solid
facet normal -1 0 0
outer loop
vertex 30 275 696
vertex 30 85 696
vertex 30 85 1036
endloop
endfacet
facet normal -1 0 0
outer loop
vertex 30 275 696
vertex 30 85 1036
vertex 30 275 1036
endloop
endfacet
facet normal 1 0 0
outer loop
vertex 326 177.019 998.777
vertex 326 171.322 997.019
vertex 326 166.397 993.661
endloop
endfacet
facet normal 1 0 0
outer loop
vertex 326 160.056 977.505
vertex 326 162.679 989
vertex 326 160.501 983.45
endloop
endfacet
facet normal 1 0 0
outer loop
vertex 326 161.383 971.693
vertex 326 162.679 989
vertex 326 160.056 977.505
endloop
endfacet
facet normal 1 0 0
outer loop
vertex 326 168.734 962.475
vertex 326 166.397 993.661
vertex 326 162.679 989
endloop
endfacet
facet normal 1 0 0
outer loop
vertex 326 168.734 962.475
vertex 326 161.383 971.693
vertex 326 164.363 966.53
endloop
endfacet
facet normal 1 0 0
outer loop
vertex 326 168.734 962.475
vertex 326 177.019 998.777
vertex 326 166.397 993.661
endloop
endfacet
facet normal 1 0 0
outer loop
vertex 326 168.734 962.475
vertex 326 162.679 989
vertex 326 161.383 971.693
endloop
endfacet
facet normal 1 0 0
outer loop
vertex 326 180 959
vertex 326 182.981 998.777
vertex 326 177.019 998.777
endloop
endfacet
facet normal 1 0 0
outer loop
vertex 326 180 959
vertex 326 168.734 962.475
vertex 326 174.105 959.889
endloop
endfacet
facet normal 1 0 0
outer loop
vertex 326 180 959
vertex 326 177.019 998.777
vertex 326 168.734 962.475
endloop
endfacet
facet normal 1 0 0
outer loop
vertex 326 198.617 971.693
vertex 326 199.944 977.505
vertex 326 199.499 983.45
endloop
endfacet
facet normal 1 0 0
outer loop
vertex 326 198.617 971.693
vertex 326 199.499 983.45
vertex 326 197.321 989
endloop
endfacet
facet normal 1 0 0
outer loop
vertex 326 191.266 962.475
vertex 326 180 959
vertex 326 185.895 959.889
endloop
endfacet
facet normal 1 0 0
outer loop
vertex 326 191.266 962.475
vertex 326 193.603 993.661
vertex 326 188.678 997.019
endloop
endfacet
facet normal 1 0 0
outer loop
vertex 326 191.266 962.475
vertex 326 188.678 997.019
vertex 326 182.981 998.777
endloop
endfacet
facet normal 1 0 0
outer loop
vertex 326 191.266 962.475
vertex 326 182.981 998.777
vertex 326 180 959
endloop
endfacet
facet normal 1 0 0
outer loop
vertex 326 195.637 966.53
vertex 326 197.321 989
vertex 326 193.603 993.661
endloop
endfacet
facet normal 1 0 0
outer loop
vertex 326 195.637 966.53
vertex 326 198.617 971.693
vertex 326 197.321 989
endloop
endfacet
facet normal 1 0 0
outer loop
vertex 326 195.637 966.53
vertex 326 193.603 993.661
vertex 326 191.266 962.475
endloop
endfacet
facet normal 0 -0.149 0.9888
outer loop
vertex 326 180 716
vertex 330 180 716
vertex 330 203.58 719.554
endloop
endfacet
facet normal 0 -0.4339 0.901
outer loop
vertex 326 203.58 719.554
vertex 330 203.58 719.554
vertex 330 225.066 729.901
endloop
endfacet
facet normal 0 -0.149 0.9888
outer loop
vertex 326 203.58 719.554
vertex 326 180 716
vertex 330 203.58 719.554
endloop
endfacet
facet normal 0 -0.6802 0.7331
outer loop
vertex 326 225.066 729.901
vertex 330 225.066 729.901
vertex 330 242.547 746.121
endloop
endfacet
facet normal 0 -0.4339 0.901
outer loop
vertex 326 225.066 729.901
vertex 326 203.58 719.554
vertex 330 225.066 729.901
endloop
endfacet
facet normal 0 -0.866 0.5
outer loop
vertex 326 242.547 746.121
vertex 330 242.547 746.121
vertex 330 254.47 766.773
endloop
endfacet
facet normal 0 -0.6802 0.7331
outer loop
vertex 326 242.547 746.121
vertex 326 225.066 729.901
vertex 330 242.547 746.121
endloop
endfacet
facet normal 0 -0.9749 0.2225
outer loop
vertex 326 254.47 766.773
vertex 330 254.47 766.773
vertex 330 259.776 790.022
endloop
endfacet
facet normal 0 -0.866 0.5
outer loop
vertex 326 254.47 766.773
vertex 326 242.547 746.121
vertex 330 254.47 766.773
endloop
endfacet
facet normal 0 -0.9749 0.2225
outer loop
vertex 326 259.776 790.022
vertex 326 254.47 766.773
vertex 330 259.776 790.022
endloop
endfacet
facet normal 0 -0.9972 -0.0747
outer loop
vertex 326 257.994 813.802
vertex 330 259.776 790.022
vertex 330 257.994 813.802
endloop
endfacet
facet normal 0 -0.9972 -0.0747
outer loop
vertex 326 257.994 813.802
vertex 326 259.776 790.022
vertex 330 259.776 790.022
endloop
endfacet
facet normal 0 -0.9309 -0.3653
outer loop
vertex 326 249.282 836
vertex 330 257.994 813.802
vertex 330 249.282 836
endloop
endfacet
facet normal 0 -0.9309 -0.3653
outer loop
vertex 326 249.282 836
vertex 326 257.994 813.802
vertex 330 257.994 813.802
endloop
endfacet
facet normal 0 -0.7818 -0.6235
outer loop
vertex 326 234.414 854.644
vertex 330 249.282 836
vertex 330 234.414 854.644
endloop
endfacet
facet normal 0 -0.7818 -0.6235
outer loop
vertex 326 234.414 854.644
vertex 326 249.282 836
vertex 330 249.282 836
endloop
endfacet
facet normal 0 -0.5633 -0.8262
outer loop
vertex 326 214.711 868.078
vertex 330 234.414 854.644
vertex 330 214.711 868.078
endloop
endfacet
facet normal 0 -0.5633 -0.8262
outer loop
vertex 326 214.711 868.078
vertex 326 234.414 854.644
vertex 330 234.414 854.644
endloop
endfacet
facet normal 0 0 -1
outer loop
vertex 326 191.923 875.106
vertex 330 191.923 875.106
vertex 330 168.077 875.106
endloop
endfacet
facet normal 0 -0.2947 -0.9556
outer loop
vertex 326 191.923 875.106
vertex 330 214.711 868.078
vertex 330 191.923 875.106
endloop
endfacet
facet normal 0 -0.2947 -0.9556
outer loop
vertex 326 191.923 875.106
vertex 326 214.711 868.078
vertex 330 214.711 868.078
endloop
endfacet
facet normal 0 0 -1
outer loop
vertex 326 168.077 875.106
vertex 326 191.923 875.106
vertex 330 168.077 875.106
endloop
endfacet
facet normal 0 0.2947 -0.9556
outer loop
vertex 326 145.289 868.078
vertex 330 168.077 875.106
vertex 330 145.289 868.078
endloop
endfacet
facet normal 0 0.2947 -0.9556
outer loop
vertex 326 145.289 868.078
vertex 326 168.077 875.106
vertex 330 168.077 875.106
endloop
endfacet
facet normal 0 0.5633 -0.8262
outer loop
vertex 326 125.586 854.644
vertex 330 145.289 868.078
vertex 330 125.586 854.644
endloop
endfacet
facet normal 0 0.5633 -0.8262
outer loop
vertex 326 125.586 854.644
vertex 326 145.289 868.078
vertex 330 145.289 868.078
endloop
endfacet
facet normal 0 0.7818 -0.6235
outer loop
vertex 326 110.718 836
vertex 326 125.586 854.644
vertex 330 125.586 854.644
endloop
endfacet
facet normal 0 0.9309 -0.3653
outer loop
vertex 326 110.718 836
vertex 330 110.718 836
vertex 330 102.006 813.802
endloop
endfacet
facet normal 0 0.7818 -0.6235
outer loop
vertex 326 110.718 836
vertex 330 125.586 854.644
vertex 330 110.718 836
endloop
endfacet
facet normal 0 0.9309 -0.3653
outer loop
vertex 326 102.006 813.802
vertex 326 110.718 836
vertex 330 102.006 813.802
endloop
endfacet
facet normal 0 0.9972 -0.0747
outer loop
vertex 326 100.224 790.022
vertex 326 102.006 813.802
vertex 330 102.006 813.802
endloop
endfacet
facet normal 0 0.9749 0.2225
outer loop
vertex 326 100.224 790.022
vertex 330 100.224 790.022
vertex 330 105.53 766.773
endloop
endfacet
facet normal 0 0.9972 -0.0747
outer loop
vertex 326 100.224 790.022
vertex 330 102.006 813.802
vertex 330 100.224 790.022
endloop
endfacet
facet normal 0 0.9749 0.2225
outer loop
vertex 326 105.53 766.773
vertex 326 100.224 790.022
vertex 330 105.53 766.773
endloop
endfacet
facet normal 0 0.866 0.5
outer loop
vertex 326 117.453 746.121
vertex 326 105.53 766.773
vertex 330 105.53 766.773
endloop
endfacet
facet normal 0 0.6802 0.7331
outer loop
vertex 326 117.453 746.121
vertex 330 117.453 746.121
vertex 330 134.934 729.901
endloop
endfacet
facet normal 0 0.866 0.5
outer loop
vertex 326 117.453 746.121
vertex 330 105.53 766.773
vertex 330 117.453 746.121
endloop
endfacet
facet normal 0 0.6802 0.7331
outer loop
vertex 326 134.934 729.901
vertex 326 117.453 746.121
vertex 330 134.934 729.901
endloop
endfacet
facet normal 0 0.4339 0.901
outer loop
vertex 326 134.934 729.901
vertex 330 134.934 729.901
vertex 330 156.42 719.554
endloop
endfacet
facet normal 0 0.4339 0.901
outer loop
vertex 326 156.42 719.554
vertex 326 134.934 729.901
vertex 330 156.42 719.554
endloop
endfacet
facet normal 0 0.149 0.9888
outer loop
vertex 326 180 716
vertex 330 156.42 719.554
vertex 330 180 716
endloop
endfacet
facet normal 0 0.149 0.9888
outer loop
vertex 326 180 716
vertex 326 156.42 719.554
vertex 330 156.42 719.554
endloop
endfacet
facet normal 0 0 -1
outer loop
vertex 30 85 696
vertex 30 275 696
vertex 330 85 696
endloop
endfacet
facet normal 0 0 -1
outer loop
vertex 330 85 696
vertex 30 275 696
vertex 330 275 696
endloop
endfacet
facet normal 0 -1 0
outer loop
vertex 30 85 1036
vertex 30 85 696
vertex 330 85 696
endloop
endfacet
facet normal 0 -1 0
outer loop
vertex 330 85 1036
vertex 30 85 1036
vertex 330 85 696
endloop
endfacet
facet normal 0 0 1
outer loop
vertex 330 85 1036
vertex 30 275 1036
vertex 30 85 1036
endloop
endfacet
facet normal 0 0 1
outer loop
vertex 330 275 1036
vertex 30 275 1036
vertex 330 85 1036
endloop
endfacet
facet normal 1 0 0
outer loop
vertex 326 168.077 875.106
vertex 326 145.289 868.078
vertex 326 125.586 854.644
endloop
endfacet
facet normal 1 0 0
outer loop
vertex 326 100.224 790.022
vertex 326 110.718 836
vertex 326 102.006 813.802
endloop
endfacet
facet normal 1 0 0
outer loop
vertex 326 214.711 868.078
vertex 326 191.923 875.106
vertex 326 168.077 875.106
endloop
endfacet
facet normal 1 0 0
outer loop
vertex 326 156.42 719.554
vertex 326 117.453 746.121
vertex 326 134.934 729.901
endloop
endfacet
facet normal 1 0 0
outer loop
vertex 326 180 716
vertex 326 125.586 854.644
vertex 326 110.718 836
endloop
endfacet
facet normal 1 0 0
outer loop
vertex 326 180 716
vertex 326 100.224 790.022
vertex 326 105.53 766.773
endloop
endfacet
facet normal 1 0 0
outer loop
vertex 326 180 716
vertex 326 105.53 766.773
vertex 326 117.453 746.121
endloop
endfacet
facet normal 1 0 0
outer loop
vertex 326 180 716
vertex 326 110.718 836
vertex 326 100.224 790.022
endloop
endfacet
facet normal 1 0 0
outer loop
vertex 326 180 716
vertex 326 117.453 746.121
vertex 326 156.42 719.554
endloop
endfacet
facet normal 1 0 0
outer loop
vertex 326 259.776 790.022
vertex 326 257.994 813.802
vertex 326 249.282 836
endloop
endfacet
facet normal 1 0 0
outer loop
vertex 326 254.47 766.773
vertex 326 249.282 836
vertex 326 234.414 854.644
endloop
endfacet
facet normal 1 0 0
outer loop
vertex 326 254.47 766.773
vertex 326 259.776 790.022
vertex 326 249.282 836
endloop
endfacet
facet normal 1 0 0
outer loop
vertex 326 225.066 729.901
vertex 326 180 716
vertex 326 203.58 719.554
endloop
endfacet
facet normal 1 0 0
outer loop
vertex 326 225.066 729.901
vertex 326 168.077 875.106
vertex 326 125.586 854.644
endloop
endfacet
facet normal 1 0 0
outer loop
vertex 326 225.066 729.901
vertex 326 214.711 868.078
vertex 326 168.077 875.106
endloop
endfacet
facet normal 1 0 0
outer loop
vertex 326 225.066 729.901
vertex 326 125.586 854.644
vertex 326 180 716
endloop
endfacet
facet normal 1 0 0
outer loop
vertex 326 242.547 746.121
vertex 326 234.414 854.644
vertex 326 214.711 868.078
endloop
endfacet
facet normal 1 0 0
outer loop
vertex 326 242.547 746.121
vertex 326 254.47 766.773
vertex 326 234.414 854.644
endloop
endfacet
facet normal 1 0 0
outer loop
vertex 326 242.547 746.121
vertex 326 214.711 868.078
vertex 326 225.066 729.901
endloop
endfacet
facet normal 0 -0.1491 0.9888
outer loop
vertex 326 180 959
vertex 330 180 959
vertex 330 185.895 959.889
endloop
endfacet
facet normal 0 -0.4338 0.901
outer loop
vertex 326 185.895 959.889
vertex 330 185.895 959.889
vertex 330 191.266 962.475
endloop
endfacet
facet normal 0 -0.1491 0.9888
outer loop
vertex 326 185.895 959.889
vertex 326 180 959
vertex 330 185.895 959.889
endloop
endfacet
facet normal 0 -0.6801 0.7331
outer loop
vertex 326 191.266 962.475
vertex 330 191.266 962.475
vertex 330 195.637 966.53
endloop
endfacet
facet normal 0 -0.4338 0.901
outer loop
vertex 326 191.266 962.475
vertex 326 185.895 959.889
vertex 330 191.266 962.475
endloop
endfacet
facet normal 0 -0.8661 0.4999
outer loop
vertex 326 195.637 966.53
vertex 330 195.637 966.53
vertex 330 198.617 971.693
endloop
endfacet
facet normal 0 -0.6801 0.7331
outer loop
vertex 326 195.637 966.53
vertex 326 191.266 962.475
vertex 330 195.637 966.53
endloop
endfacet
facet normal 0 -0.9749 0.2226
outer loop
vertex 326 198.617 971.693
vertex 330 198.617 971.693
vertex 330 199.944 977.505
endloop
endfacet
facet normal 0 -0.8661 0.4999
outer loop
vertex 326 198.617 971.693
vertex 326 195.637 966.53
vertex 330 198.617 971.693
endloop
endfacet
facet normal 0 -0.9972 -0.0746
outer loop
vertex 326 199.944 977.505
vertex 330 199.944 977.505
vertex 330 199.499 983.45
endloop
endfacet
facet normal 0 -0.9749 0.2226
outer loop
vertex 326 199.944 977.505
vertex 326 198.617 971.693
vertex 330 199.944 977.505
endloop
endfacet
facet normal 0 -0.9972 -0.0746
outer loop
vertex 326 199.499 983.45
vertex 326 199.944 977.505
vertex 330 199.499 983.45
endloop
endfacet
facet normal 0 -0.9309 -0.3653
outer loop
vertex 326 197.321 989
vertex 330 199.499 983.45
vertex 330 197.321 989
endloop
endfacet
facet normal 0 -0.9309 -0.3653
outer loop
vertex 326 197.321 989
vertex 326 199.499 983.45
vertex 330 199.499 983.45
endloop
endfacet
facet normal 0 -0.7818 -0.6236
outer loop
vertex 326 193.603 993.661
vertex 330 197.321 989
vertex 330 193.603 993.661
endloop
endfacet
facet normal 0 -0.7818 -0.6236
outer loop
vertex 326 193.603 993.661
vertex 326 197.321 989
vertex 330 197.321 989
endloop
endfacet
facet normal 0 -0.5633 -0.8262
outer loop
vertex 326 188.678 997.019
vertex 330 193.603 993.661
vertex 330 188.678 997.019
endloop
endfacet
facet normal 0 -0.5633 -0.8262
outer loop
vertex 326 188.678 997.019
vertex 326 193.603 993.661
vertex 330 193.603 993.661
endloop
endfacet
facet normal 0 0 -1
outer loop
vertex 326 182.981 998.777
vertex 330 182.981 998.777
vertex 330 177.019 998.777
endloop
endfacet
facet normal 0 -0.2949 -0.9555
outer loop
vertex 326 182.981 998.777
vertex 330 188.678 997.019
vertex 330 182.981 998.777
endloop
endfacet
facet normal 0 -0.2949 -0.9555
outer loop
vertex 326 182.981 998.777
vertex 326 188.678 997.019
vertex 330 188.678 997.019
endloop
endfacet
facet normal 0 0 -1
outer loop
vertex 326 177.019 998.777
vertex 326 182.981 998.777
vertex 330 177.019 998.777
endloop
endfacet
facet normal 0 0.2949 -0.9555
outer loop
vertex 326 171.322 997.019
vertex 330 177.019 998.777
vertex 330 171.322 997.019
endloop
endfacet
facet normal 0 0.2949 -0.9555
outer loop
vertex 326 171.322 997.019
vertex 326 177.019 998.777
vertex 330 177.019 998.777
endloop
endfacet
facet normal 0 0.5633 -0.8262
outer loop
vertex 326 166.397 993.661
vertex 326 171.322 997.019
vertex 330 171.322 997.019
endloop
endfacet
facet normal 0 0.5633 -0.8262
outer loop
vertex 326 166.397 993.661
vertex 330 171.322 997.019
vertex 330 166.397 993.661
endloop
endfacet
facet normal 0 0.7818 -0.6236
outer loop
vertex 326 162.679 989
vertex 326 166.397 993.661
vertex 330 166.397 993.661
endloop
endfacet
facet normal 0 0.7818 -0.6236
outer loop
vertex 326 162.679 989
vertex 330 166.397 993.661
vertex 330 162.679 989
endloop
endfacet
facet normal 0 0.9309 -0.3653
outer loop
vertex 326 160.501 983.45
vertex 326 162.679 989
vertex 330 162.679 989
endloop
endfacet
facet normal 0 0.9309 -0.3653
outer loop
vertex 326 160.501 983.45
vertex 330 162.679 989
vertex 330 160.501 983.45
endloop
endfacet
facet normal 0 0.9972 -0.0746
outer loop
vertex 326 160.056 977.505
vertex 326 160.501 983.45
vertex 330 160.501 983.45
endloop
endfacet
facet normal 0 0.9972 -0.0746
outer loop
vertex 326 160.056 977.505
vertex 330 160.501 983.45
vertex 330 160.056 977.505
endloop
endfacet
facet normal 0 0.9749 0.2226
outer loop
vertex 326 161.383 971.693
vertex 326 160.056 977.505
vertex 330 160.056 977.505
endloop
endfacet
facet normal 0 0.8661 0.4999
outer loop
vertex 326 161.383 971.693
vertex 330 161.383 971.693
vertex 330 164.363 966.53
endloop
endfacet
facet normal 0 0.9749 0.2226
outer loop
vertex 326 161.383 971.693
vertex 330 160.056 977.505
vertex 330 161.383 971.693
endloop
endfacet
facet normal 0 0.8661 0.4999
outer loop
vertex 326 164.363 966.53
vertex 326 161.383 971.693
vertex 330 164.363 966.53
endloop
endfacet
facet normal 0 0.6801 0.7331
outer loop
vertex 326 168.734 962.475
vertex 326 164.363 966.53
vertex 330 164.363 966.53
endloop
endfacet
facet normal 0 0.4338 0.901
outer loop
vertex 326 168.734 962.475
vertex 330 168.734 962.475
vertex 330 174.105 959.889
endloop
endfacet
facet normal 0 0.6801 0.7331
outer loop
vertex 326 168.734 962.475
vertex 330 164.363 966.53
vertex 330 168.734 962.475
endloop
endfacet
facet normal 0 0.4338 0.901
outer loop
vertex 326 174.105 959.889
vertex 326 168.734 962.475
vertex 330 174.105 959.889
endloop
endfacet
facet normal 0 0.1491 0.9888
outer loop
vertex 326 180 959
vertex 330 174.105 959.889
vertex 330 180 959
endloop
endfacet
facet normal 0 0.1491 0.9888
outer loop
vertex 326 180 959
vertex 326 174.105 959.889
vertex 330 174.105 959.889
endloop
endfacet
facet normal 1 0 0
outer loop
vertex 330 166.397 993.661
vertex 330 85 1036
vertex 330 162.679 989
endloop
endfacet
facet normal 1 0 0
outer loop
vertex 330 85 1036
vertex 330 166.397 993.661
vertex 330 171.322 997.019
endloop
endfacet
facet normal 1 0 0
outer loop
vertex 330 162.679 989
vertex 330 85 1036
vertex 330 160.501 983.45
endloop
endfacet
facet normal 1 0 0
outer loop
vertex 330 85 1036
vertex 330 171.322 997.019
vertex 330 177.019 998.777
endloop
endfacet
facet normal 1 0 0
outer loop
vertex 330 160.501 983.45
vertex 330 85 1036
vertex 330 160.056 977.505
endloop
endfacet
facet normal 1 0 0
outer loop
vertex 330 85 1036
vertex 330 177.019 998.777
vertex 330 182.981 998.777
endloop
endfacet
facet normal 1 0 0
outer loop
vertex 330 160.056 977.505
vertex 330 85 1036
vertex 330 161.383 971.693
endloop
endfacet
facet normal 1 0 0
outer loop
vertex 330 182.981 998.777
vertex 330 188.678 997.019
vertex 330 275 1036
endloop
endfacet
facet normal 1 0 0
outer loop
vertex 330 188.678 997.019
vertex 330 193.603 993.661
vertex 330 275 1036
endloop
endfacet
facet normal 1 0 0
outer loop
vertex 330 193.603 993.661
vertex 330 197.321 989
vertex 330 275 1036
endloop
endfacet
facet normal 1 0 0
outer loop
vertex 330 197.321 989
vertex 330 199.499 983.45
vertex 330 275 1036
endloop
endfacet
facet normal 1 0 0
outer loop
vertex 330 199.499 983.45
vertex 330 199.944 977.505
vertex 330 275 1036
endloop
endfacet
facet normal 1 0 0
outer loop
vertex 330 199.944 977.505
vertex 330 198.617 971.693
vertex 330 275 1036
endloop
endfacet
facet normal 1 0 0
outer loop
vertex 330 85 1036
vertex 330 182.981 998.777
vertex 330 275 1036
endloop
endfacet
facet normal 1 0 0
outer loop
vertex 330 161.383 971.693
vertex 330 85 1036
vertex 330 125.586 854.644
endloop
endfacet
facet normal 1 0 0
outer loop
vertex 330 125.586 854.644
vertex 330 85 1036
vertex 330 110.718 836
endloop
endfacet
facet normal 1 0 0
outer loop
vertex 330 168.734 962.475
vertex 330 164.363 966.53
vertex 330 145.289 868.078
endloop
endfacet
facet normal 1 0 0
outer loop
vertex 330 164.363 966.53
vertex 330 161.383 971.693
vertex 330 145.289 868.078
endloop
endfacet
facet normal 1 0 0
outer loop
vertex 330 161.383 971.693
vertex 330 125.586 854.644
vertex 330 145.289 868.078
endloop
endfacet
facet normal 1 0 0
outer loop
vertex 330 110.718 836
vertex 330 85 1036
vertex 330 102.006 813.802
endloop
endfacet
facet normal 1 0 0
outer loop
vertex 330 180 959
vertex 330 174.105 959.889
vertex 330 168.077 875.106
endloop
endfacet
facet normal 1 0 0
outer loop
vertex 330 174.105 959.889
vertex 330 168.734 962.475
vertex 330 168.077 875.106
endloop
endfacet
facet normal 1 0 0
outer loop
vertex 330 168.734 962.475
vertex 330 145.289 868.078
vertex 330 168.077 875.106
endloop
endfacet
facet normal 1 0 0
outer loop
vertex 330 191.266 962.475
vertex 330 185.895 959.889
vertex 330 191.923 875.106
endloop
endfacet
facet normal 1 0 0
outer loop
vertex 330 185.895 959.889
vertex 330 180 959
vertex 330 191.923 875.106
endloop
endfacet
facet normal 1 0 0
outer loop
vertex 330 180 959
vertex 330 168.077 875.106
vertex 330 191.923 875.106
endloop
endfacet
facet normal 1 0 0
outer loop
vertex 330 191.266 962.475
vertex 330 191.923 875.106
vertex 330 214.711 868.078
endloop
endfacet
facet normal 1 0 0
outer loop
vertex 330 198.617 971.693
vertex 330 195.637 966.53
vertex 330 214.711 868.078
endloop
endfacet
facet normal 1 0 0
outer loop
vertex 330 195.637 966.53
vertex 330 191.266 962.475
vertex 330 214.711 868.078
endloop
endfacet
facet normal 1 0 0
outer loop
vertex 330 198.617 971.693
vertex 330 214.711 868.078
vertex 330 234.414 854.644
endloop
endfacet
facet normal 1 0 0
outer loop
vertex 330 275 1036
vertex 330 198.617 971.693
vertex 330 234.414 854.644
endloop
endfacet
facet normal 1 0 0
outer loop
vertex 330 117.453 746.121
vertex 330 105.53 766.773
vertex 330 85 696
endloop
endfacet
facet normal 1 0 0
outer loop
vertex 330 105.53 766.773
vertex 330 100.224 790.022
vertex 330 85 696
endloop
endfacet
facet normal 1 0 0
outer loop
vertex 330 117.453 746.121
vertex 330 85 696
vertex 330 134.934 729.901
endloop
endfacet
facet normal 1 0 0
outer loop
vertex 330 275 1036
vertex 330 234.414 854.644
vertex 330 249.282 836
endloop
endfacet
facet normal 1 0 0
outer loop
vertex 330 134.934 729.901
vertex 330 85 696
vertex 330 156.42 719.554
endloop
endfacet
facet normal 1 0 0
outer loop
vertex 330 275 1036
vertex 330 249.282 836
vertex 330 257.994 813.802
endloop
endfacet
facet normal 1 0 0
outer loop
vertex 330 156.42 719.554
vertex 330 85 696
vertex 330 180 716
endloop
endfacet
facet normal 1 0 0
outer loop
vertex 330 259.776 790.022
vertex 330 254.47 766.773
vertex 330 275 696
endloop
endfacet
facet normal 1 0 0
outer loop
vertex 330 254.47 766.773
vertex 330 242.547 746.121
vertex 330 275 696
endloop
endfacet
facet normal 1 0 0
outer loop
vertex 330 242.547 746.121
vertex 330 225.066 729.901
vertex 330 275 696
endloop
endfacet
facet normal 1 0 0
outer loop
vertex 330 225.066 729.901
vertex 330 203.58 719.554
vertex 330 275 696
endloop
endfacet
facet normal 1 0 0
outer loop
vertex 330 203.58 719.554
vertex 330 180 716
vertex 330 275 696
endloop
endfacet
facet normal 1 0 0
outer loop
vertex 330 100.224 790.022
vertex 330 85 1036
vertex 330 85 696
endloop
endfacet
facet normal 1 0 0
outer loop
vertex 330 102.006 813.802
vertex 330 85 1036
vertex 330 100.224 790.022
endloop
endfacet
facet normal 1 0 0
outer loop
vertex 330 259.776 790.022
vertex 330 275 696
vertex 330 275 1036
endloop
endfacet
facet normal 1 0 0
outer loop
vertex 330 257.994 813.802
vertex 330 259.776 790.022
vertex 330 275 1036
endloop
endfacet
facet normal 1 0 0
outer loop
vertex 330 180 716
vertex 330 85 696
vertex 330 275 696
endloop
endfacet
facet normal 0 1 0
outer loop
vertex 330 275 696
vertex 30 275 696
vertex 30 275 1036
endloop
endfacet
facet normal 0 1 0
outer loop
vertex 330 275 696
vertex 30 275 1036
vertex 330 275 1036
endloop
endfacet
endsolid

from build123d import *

# Parameters (mm, degrees)
CYLINDER003_R     = 20
CYLINDER003_DEPTH = 10
CYLINDER002_R     = 80
CYLINDER002_DEPTH = 10
BOX006_W          = 300
BOX006_H          = 190
BOX006_DEPTH      = 340


with BuildPart() as cylinder003:
    # Cylinder003 → Cylinder003 (new body)
    with BuildSketch(Plane(origin=(296, 95, 1133), x_dir=(0, 0, -1), z_dir=(1, 0, 0))):
        Circle(CYLINDER003_R)
    extrude(amount=CYLINDER003_DEPTH)


with BuildPart() as cylinder002:
    # Cylinder002 → Cylinder002 (new body)
    with BuildSketch(Plane(origin=(296, 95, 950), x_dir=(0, 0, -1), z_dir=(1, 0, 0))):
        Circle(CYLINDER002_R)
    extrude(amount=CYLINDER002_DEPTH)


with BuildPart() as speaker002:
    # Box006 → Box006 (new body)
    with BuildSketch(Plane.XY.offset(850)):
        with Locations((150, 95)):
            Rectangle(BOX006_W, BOX006_H)
    extrude(amount=BOX006_DEPTH)

    # Cut003: cut Cylinder002
    add(cylinder002.part, mode=Mode.SUBTRACT)

    # Cut002: cut Cylinder003
    add(cylinder003.part, mode=Mode.SUBTRACT)


with BuildPart() as speaker002_1:
    # Cut002 placement: moved
    add(speaker002.part.moved(Location((30, 85, -154))))


solid = speaker002_1.part
